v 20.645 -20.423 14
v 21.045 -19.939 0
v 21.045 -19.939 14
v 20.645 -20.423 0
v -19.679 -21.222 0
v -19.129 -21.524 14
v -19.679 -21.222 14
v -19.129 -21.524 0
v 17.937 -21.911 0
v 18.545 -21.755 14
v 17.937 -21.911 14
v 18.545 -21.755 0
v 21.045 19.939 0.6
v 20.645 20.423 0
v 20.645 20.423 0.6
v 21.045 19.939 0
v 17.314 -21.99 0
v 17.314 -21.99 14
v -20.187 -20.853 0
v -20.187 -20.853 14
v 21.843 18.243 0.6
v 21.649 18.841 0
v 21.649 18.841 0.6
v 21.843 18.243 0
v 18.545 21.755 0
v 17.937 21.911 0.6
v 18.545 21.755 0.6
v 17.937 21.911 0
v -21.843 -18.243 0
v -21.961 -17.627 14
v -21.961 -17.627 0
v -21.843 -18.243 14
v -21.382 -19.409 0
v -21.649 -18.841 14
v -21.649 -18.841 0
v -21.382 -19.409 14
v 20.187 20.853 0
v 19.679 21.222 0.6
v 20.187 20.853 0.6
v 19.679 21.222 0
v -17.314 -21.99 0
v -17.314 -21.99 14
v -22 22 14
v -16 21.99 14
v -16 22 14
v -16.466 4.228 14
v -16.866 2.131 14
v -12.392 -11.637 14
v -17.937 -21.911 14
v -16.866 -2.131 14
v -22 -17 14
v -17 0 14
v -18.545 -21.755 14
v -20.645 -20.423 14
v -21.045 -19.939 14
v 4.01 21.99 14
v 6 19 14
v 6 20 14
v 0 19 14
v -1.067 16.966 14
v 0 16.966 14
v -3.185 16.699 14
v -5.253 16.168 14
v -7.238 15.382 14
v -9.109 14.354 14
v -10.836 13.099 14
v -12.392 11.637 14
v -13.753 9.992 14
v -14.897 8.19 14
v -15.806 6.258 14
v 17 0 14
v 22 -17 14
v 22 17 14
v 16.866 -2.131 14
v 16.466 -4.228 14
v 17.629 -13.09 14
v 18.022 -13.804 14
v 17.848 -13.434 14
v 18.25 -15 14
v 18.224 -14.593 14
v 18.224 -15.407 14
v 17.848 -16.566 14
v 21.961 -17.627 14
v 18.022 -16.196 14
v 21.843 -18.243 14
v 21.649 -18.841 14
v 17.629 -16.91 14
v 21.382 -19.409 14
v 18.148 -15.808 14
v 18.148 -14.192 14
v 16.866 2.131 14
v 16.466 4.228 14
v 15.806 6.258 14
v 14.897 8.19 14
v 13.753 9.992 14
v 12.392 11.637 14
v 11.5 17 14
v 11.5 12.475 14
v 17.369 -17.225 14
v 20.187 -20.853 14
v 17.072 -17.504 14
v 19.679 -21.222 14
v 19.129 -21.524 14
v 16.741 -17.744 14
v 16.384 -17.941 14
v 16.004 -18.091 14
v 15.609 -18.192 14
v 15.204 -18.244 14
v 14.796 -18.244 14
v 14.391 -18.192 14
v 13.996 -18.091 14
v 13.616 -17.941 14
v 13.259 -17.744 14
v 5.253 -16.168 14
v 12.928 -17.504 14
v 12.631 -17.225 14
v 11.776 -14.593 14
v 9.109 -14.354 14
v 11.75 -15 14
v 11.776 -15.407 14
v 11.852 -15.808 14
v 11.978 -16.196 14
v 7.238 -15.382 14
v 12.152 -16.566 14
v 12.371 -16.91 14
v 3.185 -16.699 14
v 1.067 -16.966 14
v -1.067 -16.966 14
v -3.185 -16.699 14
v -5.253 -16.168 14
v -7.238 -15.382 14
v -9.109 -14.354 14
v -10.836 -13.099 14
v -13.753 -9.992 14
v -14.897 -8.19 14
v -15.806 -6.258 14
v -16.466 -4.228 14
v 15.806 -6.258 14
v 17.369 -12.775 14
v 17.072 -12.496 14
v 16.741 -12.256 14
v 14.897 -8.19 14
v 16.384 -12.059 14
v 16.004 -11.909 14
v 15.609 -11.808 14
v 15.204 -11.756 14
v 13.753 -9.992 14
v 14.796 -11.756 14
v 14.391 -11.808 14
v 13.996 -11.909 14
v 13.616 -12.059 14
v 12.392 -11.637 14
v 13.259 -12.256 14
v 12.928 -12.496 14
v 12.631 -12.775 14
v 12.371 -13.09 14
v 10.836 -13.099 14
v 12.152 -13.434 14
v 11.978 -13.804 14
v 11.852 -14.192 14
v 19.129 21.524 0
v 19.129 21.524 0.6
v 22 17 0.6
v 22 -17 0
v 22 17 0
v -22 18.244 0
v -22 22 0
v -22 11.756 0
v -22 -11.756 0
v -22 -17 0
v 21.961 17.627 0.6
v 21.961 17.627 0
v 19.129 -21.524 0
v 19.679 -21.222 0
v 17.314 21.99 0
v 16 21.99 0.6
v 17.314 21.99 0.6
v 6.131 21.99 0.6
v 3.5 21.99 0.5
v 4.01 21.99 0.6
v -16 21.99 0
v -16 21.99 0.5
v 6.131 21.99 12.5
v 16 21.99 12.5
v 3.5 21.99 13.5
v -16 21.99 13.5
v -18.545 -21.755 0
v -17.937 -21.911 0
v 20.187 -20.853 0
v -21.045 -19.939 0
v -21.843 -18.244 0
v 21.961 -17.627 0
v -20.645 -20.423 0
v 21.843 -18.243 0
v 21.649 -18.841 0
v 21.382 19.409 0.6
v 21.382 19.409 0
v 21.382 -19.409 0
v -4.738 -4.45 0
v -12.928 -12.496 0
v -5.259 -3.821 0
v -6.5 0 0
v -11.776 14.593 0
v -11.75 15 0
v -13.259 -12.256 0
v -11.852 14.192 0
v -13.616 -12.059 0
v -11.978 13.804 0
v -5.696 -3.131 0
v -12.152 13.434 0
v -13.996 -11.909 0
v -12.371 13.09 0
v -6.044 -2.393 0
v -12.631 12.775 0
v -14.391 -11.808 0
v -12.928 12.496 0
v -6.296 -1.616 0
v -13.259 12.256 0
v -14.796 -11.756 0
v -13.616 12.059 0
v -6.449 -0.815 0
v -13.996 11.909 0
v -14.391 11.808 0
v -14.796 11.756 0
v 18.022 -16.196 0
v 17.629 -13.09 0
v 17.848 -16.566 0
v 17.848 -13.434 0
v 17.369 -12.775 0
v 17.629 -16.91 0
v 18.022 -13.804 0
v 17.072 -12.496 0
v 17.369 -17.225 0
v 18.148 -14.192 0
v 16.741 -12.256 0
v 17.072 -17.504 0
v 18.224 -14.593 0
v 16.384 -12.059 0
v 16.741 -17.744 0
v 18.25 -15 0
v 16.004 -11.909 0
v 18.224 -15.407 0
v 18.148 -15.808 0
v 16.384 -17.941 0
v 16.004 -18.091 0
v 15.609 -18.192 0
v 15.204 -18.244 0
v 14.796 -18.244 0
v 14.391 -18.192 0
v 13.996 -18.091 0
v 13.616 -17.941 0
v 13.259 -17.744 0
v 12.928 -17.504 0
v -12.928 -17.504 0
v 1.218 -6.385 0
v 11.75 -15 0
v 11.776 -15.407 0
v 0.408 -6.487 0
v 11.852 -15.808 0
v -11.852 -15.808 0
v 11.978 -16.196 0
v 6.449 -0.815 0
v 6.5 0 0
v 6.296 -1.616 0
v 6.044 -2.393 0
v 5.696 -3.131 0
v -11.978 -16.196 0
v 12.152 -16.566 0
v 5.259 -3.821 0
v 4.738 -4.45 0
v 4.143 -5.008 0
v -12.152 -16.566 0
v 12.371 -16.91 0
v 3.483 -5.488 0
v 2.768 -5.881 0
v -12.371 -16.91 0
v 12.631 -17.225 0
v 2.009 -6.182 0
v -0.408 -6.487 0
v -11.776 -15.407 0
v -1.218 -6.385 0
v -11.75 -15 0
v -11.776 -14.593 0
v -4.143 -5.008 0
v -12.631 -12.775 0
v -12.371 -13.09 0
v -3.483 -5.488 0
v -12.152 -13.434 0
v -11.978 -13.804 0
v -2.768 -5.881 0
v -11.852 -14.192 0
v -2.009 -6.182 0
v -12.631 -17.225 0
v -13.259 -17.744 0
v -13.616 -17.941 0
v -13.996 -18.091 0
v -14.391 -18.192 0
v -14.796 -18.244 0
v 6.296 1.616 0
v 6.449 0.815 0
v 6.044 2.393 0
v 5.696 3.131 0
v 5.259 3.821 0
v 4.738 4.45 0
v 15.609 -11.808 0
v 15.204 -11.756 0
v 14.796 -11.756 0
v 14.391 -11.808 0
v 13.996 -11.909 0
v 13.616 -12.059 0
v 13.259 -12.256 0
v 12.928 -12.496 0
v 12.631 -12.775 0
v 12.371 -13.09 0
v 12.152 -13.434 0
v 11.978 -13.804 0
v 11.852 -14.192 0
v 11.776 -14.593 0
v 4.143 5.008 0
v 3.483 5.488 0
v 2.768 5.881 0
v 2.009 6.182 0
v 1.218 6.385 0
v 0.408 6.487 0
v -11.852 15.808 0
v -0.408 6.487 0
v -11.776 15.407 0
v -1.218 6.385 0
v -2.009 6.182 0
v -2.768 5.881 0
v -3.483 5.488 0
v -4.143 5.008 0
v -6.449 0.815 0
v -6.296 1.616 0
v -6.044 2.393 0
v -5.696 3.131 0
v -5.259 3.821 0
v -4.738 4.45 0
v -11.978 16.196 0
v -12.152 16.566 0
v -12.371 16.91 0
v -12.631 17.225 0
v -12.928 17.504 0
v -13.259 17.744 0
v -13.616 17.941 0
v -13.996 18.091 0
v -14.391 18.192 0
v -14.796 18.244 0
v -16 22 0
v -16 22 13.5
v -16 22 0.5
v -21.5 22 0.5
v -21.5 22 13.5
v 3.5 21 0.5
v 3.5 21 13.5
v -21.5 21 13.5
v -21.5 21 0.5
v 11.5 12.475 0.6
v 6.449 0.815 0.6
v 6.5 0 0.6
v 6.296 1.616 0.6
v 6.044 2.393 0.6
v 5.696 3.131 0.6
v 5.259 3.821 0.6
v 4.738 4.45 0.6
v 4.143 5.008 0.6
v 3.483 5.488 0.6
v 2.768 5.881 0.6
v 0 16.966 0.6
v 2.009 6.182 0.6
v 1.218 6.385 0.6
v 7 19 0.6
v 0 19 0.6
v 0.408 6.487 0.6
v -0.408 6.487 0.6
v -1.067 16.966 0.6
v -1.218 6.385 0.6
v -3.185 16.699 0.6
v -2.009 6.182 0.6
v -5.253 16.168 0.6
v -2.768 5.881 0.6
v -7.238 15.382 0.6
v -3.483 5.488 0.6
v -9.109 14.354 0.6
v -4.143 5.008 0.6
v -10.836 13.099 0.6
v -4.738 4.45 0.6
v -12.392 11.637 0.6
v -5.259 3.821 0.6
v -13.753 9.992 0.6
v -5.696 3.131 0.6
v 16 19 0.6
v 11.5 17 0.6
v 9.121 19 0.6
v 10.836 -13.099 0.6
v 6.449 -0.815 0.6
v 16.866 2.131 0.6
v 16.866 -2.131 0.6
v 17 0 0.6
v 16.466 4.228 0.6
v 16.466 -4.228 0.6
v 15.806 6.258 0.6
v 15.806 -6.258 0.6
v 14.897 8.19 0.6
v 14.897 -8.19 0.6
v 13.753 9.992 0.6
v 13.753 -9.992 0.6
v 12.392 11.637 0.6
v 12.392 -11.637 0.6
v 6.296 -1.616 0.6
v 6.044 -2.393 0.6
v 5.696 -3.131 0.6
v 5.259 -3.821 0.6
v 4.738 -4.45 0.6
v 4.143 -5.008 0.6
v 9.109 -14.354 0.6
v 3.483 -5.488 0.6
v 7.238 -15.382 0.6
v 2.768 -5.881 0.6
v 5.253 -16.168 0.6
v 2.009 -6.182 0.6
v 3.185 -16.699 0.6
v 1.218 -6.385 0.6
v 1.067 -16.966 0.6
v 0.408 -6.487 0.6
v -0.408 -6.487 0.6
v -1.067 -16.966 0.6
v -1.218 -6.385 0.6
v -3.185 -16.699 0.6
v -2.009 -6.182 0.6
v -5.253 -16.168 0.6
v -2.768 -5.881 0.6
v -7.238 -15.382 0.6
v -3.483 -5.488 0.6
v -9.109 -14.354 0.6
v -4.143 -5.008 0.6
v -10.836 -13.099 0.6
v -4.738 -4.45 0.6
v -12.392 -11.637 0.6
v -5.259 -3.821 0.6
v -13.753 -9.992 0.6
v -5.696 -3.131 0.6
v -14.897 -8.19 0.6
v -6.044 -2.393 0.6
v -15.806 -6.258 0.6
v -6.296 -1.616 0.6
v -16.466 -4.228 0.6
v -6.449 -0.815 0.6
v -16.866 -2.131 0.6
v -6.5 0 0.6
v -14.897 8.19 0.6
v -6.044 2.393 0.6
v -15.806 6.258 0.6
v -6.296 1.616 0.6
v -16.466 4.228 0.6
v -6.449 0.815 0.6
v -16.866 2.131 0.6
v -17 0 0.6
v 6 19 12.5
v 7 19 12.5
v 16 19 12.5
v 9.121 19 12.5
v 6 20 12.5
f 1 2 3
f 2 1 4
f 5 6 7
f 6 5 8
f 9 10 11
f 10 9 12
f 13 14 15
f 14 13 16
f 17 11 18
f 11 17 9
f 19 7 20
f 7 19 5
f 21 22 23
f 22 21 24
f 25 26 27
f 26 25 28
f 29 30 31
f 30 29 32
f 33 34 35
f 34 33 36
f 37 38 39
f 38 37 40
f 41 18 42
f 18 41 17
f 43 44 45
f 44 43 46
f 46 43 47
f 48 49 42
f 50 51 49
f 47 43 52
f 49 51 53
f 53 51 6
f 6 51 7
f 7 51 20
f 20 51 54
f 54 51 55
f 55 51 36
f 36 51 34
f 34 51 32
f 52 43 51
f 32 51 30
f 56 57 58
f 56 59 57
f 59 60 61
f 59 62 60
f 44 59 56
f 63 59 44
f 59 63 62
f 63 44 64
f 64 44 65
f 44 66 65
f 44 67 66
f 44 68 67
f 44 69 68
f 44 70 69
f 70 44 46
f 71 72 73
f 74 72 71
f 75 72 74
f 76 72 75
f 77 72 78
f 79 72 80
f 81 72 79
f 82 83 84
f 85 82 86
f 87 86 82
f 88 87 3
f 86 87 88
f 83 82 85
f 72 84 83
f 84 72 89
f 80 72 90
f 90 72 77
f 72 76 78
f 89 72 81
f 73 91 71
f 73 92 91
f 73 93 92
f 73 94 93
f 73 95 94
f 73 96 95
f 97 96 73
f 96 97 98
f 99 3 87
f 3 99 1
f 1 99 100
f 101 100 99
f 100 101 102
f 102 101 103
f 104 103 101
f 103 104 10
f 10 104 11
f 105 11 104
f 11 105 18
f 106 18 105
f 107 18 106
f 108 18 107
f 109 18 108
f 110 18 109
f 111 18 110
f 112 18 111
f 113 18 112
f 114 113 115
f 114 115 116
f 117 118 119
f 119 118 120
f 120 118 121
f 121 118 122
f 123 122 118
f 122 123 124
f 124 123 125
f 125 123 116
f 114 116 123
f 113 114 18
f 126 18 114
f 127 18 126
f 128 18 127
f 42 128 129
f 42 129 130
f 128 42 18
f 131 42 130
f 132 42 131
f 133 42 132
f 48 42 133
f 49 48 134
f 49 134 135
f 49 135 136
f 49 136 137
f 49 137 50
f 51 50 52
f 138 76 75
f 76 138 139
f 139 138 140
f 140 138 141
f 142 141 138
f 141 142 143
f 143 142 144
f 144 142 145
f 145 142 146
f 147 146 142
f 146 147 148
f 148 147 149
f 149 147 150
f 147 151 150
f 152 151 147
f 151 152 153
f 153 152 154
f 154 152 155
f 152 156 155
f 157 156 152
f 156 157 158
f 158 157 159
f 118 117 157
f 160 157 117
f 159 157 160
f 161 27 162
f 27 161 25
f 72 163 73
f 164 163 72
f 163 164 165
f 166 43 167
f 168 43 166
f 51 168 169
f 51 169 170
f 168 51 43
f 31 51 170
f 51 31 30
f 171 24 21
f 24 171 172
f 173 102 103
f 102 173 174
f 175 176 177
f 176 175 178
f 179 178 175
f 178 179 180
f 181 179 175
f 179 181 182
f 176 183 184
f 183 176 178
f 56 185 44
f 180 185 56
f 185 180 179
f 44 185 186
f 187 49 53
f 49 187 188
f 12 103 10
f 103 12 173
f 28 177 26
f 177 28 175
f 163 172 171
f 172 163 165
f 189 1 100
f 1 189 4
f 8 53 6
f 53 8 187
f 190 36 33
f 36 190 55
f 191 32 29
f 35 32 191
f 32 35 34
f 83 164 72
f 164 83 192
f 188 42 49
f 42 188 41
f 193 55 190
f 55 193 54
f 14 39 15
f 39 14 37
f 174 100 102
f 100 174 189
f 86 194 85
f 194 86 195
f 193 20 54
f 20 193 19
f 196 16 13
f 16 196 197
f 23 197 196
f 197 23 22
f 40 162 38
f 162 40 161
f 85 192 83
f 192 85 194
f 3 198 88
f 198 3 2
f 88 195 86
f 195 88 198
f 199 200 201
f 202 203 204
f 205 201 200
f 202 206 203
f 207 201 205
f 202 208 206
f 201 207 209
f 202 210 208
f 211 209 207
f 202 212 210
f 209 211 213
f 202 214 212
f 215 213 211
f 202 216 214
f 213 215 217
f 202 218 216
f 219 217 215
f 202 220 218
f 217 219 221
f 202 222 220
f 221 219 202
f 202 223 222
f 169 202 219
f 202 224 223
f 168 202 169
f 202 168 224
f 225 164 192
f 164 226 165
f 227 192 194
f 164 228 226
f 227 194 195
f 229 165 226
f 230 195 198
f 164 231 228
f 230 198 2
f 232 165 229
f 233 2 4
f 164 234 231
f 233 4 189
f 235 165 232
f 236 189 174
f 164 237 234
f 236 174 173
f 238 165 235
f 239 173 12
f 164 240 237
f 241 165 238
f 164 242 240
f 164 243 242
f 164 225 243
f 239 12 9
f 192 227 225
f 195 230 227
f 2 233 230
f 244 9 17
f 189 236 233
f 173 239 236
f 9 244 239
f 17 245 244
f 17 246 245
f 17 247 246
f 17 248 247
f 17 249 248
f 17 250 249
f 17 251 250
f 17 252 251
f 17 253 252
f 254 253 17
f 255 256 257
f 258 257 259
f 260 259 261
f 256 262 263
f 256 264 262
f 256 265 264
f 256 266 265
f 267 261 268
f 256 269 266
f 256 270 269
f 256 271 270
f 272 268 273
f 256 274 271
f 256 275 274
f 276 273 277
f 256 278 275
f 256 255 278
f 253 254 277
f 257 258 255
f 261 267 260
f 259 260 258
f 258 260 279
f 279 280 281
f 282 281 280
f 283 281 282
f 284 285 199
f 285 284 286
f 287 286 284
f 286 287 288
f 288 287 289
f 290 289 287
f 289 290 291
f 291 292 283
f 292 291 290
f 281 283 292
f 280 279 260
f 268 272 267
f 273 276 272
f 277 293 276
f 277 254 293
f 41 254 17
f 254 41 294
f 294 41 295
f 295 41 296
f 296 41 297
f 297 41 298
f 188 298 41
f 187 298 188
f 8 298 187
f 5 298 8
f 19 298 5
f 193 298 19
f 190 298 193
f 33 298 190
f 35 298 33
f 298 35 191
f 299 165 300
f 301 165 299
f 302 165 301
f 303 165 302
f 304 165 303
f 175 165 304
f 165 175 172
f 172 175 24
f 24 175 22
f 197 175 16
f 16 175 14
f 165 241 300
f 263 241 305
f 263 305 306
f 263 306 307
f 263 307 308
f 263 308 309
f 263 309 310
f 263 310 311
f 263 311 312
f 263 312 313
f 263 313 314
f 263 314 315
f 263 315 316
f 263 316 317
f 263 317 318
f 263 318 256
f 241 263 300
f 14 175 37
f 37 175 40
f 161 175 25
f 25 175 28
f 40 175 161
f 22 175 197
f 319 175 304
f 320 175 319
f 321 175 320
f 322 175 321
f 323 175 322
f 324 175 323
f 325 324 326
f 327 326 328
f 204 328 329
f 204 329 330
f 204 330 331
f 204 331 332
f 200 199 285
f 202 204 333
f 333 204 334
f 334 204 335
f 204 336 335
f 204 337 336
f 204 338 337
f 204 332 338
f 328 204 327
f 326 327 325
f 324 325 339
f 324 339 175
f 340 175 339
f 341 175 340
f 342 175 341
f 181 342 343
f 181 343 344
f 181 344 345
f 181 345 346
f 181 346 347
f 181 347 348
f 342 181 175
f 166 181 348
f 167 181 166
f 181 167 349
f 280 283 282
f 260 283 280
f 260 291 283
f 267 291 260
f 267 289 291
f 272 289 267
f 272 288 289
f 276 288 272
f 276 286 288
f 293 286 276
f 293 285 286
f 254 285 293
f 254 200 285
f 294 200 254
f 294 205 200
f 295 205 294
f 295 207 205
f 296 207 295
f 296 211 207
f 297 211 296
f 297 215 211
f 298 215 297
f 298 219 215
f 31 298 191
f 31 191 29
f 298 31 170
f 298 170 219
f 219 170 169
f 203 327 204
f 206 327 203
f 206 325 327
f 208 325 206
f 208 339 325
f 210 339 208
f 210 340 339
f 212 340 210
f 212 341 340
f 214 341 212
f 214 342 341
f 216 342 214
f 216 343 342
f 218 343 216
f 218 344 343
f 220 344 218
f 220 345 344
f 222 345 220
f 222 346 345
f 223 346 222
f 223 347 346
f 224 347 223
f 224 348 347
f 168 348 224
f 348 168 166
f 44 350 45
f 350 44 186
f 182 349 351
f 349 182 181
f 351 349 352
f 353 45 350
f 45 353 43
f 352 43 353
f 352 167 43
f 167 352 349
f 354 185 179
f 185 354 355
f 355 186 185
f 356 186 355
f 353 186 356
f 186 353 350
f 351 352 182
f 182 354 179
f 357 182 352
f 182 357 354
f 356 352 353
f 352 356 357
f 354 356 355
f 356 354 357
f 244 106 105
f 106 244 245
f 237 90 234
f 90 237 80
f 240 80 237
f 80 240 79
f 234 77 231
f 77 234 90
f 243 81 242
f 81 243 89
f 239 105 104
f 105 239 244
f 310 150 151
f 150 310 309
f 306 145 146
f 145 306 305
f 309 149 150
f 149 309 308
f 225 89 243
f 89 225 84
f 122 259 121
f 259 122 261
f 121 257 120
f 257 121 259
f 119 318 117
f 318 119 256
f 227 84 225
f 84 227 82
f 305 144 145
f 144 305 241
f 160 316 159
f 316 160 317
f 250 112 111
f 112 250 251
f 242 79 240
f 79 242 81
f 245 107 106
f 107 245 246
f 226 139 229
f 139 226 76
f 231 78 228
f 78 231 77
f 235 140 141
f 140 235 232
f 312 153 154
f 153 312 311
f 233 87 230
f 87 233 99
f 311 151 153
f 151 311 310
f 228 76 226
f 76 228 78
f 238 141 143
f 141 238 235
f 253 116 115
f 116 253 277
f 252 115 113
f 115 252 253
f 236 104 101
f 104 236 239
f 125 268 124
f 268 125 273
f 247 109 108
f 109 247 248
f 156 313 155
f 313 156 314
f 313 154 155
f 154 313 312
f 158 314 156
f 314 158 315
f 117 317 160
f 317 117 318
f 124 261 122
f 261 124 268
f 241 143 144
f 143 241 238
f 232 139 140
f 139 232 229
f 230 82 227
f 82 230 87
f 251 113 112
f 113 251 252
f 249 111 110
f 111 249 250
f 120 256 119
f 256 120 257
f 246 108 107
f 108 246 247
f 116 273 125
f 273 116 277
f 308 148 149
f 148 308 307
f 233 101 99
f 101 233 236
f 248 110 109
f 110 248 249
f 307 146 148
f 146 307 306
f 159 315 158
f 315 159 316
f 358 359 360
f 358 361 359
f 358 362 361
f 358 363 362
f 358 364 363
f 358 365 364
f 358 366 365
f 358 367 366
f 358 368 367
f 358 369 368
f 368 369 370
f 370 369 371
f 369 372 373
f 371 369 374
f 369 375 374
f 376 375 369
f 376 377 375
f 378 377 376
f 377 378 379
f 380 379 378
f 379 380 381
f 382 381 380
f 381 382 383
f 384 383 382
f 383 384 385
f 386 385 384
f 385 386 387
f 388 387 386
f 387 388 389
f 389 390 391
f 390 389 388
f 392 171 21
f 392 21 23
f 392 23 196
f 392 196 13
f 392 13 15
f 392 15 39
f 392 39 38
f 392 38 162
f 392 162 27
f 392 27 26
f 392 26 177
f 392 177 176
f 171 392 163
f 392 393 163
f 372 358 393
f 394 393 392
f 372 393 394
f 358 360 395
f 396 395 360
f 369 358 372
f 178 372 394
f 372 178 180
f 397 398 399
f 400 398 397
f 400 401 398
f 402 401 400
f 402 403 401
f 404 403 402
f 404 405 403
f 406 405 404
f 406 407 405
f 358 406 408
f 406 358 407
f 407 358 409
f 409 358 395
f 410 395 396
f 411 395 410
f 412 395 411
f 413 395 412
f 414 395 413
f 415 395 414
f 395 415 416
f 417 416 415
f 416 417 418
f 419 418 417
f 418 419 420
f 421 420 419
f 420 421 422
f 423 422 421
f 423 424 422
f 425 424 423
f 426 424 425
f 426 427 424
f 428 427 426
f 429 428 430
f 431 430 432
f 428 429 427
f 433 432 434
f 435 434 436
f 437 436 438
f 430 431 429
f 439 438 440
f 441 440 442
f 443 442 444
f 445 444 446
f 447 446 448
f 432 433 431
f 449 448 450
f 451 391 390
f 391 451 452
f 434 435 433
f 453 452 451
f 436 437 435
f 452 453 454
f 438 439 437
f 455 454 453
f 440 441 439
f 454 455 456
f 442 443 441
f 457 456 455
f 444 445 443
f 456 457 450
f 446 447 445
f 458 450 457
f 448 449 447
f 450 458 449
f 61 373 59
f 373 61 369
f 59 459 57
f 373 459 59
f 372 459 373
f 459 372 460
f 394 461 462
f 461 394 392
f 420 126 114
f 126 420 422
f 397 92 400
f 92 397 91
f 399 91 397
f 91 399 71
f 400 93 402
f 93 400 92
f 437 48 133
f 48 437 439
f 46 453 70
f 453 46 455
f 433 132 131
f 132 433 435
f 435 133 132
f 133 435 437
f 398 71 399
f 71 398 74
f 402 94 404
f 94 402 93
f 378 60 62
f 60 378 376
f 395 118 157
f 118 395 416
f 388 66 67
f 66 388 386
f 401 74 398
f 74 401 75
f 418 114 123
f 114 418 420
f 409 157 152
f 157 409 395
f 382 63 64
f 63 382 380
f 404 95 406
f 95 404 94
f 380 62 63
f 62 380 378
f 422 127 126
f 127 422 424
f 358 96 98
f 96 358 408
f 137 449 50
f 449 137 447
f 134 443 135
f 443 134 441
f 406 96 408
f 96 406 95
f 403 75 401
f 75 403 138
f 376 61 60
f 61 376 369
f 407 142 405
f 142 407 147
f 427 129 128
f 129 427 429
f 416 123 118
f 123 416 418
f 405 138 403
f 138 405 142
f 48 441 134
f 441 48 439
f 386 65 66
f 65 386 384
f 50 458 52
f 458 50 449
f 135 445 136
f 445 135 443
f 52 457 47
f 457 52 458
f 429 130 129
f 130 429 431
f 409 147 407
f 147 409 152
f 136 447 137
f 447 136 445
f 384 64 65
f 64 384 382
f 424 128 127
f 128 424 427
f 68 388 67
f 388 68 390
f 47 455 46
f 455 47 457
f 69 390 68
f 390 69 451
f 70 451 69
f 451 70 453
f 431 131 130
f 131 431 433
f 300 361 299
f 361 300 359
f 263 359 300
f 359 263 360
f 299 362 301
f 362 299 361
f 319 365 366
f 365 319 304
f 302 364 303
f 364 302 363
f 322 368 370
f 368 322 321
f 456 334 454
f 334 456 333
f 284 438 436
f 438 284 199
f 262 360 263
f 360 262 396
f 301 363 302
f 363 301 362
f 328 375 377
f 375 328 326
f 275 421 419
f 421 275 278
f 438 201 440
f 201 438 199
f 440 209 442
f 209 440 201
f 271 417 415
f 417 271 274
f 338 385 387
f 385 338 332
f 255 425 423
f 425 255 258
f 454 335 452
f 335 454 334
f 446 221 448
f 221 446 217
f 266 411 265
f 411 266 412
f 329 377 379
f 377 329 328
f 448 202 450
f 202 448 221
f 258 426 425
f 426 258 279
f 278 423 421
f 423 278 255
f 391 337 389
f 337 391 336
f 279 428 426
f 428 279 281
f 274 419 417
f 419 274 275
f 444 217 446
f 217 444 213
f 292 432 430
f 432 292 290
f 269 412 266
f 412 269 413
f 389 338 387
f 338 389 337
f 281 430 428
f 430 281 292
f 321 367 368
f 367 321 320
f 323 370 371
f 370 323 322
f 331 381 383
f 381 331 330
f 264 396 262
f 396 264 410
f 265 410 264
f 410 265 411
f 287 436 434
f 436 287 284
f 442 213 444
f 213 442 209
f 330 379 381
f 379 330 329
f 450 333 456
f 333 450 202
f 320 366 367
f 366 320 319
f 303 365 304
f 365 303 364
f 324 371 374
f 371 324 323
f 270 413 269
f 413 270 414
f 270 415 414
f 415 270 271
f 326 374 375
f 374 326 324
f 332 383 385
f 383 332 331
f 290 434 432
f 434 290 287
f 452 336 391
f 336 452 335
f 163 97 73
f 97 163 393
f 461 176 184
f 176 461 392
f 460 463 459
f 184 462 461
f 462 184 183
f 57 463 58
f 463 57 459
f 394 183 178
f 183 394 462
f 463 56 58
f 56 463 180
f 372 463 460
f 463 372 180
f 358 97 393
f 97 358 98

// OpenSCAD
$fn = 50;


difference() {
	union() {
		hull() {
			translate(v = [-17.0000000000, 17.0000000000, 0]) {
				cylinder(h = 14, r = 5);
			}
			translate(v = [17.0000000000, 17.0000000000, 0]) {
				cylinder(h = 14, r = 5);
			}
			translate(v = [-17.0000000000, -17.0000000000, 0]) {
				cylinder(h = 14, r = 5);
			}
			translate(v = [17.0000000000, -17.0000000000, 0]) {
				cylinder(h = 14, r = 5);
			}
		}
		translate(v = [-22.0000000000, 16.0000000000, 0]) {
			cube(size = [6, 6, 14]);
		}
	}
	union() {
		translate(v = [-22.5000000000, -15.0000000000, -250.0000000000]) {
			rotate(a = [0, 0, 0]) {
				difference() {
					union() {
						hull() {
							translate(v = [7.5000000000, 0, 0]) {
								cylinder(h = 250, r = 3.2500000000, r1 = 3.2500000000, r2 = 3.2500000000);
							}
							translate(v = [-7.5000000000, 0, 0]) {
								cylinder(h = 250, r = 3.2500000000, r1 = 3.2500000000, r2 = 3.2500000000);
							}
						}
					}
					union();
				}
			}
		}
		translate(v = [-22.5000000000, 15.0000000000, -250.0000000000]) {
			rotate(a = [0, 0, 0]) {
				difference() {
					union() {
						hull() {
							translate(v = [7.5000000000, 0, 0]) {
								cylinder(h = 250, r = 3.2500000000, r1 = 3.2500000000, r2 = 3.2500000000);
							}
							translate(v = [-7.5000000000, 0, 0]) {
								cylinder(h = 250, r = 3.2500000000, r1 = 3.2500000000, r2 = 3.2500000000);
							}
						}
					}
					union();
				}
			}
		}
		translate(v = [-21.5000000000, 21.0000000000, 0.5000000000]) {
			cube(size = [25, 1, 13.0000000000]);
		}
		translate(v = [15.0000000000, -15.0000000000, -50.0000000000]) {
			cylinder(h = 100, r = 3.2500000000);
		}
		translate(v = [0.0000000000, 11.0000000000, 0.6000000000]) {
			cube(size = [11, 8, 16.4000000000]);
		}
		translate(v = [0, 0, 0.6000000000]) {
			cylinder(h = 16.4000000000, r = 17.0000000000);
		}
		translate(v = [0, 0, -7.0000000000]) {
			cylinder(h = 14, r = 6.5000000000);
		}
		translate(v = [0.0000000000, 17.0000000000, 0.6000000000]) {
			cube(size = [22.0000000000, 2, 16.4000000000]);
		}
		translate(v = [16.0000000000, 17.0000000000, 0.6000000000]) {
			cube(size = [6, 5, 16.4000000000]);
		}
		translate(v = [6.0000000000, 17.0000000000, 12.5000000000]) {
			cube(size = [16, 5, 1.5000000000]);
		}
		translate(v = [3.2500000000, 22.7500000000, 0.6000000000]) {
			rotate(a = [0, 0, -45]) {
				cube(size = [7.5000000000, 1.5000000000, 16.4000000000]);
			}
		}
		translate(v = [2.5000000000, 12.0000000000, 0.6000000000]) {
			cube(size = [9.0000000000, 5, 13.4000000000]);
		}
	}
}
